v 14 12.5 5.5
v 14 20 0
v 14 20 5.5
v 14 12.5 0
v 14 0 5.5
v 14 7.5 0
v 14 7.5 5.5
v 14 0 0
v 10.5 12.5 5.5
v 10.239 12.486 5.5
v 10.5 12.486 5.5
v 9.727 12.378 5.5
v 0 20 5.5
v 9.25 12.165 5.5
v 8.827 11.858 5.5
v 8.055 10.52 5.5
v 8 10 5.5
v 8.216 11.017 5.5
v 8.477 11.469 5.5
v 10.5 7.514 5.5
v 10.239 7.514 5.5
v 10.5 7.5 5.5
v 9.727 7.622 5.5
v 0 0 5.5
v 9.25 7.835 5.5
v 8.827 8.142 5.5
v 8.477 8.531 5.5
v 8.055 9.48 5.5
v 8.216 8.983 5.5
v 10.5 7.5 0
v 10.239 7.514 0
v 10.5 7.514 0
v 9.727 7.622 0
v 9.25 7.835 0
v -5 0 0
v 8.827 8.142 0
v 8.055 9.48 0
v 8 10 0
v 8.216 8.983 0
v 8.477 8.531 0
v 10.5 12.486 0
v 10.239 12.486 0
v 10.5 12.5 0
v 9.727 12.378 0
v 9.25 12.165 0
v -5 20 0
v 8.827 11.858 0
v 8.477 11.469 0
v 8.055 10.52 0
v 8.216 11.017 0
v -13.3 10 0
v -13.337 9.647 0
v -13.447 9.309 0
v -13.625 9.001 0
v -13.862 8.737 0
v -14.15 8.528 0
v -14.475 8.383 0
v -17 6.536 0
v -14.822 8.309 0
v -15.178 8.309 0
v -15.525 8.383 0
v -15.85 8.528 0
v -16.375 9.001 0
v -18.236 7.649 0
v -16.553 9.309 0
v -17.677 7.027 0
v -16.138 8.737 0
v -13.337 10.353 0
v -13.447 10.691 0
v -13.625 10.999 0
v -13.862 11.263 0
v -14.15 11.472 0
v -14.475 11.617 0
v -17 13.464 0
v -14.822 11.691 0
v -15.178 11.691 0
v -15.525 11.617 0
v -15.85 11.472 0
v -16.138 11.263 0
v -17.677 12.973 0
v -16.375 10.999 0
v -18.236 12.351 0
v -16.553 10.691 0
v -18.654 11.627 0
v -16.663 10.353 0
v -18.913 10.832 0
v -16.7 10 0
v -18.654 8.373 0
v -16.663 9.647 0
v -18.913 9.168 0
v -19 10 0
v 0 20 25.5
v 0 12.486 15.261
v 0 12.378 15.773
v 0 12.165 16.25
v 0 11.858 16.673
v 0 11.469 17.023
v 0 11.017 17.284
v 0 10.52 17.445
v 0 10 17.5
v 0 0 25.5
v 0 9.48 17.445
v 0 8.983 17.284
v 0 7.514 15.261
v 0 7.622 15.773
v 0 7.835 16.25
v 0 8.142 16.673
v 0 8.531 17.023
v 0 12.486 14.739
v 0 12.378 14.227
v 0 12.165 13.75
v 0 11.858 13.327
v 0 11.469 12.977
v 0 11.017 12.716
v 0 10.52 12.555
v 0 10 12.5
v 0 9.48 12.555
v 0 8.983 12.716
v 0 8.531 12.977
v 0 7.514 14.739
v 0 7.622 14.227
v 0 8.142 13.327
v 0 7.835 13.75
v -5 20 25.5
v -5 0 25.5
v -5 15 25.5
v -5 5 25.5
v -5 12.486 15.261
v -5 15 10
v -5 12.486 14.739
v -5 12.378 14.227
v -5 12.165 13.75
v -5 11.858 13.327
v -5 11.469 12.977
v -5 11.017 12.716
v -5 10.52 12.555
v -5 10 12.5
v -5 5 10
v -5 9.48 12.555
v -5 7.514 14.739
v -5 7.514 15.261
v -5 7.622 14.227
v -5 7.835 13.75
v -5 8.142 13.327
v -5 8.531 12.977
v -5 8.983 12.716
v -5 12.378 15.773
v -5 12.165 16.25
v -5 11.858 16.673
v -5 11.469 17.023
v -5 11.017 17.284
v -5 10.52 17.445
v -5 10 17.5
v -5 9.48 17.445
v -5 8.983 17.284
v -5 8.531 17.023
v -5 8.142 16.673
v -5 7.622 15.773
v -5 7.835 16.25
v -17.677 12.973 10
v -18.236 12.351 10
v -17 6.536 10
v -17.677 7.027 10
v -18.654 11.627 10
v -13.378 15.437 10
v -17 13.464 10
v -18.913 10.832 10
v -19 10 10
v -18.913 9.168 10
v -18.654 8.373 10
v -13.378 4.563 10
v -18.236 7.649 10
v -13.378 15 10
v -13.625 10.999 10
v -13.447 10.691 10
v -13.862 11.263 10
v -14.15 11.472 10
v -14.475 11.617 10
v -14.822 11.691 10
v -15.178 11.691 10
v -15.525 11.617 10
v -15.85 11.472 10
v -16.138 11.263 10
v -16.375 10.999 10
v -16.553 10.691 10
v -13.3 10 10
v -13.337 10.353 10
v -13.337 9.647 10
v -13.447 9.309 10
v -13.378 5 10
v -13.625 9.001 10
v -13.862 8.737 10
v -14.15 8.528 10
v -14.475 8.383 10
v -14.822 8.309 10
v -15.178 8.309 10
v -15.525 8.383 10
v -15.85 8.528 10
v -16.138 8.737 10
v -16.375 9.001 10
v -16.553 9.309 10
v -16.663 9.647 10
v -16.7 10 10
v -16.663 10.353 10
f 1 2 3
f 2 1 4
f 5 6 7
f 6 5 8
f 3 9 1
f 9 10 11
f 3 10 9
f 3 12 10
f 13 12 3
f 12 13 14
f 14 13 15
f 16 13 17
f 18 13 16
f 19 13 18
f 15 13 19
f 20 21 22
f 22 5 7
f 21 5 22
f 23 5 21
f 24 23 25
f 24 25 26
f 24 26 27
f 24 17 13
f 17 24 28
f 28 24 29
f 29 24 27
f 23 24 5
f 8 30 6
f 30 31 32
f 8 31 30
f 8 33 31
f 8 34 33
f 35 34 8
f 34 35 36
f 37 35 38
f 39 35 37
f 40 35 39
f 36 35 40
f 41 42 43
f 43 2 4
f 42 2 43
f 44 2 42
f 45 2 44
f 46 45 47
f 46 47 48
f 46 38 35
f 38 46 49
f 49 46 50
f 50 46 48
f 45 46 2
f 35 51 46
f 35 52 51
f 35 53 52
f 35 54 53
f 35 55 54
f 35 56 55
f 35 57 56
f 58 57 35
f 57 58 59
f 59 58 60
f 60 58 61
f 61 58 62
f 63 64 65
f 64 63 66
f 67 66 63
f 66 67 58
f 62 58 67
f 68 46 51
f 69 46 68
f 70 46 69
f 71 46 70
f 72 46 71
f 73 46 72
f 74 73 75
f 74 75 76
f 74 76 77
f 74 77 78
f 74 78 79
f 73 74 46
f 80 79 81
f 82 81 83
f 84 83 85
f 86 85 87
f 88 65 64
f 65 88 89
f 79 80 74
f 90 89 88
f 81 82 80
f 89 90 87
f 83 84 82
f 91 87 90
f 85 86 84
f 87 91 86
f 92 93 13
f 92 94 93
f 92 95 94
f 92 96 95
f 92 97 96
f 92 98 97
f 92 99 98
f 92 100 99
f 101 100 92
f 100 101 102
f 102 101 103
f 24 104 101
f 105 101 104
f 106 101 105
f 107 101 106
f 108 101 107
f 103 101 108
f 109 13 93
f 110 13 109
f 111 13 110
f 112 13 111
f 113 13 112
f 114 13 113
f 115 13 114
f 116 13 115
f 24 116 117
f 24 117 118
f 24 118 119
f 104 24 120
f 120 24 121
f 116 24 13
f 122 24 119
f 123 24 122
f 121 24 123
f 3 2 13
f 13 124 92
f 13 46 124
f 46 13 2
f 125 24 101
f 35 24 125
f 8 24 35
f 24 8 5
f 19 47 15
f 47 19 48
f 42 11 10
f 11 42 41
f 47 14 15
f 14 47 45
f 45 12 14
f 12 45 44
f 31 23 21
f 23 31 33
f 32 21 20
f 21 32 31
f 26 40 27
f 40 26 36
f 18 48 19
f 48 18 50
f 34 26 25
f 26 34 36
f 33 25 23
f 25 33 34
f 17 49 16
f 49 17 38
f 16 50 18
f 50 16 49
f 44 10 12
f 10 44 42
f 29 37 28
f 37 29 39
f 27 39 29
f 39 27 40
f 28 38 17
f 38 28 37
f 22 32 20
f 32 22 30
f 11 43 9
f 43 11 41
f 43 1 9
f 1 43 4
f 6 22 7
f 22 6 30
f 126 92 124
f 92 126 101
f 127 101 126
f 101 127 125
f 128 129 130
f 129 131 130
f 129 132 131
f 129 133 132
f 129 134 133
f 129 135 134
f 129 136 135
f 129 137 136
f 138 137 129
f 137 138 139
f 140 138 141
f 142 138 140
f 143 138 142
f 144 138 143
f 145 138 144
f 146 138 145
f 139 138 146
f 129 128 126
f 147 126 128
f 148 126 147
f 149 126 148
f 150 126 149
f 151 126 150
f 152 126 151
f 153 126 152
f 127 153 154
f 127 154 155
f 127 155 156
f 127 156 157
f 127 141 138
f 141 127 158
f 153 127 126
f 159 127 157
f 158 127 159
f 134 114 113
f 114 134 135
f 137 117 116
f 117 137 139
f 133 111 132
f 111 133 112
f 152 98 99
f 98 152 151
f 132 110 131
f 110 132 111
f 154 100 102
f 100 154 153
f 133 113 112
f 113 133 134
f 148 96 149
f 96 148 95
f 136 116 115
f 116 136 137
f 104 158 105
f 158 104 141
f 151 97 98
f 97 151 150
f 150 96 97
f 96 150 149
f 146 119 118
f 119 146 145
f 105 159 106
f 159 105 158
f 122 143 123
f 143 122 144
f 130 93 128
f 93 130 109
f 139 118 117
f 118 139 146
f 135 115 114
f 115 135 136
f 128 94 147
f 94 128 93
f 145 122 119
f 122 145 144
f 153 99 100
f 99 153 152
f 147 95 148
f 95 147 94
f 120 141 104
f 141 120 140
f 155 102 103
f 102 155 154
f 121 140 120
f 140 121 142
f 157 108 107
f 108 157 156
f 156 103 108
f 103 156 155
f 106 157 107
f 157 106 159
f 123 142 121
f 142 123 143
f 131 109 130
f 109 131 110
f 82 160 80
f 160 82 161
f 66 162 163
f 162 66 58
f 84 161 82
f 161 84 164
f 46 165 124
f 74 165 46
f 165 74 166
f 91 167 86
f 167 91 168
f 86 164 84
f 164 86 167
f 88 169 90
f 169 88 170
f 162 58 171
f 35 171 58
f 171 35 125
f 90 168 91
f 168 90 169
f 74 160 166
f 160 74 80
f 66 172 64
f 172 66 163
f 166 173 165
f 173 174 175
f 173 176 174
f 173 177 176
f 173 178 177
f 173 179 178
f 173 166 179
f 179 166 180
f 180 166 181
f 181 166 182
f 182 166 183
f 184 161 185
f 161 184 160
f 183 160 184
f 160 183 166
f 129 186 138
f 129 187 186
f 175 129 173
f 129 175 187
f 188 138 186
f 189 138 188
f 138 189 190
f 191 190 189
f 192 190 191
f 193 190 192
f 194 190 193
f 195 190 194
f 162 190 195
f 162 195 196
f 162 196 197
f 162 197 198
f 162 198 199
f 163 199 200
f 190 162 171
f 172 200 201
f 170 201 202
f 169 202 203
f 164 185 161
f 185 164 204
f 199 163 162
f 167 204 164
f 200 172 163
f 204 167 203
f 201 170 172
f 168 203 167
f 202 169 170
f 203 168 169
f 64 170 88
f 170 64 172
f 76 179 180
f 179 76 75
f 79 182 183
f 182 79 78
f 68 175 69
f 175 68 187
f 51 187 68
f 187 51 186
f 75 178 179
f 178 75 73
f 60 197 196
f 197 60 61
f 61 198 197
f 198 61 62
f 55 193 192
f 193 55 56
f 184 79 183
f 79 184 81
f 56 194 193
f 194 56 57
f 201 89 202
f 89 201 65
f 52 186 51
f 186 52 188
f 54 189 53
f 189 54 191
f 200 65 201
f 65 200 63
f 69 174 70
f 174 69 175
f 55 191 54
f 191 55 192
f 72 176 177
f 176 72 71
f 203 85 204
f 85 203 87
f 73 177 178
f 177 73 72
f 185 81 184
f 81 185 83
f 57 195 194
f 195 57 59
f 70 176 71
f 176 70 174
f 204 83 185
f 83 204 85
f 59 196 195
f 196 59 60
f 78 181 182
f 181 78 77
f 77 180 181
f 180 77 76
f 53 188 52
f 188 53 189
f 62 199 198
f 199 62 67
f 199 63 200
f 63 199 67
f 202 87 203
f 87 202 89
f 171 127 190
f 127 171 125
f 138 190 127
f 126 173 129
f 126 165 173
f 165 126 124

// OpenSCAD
//translate([0,40,0])
//import_stl("Bed_Bracket_45_1.0.stl");

// The size of the hole for the T-nut screw
screw = 5; // [3:M3, 4:M4, 5:M5]

// The length of the bed bracket
distance = 15; // [10:0.25:50]



/* [Hidden] */
$fn = 30;
screw_radius = screw / 2;

//Top mounting part
difference(){
    //Cube
    cube([14,20,5.5]);
    
    //Cut out hole
    translate([8 + screw_radius,10,0])
    cylinder(8, screw_radius, screw_radius, center=false);
    
    //Cut out slot
    translate([8 + screw_radius, 10 - screw_radius, 0]) {
        cube([6, screw_radius * 2, 6]);
    }
}



//Side mounting part

//-5 is it's thickness, 25.5 height
translate([-5,0,0])
difference() {
    cube([5,20, 25.5]);
    
    //Screw hole
    translate([0,10,15])
    rotate([00,90,0])
    cylinder(8, screw_radius, screw_radius, center=false);
}

//Bed screw hole
difference() {
    //A circle around the hole, extended to the middle part
    hull() {
        translate([-distance, 10, 0])
        cylinder(10, 4, 4);
            
        translate([-5,0,0])
        cube([5,20, 10]);
    }
    
    //Cut out the actual hole for the screw
    translate([-distance, 10, 0])
    cylinder(10,1.7,1.7);
}


//An complete mess of an angled support
//Copies the same circle, but extends it in the Z-axis to only have angled supports above the other parts
intersection() {
   union() {
        hull() {
            translate([-distance, 0, 6])
            cube([1, 5, 1]);
           
            translate([-5,0,24.5])
            cube([1,1,1]);
        
        
            translate([-5,4,24.5])
            cube([1,1,1]);
        
            translate([0,4,0])
            cube([1,1,1]);
        
        
            translate([0,0,0])
            cube([1,1,1]);
        }

        //Same as above, but on other side
        translate([0, 15, 0])
        hull() {
            translate([-distance, 0, 6])
            cube([1, 5, 1]);
            
            translate([-5,0,24.5])
            cube([1,1,1]);
                
                
            translate([-5,4,24.5])
            cube([1,1,1]);
                
            translate([0,4,0])
            cube([1,1,1]);
                
                
            translate([0,0,0])
            cube([1,1,1]);
        }
    }

    //The same circle but extended in the Z-axis to add the angled supports
    hull() {
    translate([-distance, 10, 0])
    cylinder(30, 4, 4);
        
    translate([-5,0,0])
    cube([5,20, 30]);
    }

}
